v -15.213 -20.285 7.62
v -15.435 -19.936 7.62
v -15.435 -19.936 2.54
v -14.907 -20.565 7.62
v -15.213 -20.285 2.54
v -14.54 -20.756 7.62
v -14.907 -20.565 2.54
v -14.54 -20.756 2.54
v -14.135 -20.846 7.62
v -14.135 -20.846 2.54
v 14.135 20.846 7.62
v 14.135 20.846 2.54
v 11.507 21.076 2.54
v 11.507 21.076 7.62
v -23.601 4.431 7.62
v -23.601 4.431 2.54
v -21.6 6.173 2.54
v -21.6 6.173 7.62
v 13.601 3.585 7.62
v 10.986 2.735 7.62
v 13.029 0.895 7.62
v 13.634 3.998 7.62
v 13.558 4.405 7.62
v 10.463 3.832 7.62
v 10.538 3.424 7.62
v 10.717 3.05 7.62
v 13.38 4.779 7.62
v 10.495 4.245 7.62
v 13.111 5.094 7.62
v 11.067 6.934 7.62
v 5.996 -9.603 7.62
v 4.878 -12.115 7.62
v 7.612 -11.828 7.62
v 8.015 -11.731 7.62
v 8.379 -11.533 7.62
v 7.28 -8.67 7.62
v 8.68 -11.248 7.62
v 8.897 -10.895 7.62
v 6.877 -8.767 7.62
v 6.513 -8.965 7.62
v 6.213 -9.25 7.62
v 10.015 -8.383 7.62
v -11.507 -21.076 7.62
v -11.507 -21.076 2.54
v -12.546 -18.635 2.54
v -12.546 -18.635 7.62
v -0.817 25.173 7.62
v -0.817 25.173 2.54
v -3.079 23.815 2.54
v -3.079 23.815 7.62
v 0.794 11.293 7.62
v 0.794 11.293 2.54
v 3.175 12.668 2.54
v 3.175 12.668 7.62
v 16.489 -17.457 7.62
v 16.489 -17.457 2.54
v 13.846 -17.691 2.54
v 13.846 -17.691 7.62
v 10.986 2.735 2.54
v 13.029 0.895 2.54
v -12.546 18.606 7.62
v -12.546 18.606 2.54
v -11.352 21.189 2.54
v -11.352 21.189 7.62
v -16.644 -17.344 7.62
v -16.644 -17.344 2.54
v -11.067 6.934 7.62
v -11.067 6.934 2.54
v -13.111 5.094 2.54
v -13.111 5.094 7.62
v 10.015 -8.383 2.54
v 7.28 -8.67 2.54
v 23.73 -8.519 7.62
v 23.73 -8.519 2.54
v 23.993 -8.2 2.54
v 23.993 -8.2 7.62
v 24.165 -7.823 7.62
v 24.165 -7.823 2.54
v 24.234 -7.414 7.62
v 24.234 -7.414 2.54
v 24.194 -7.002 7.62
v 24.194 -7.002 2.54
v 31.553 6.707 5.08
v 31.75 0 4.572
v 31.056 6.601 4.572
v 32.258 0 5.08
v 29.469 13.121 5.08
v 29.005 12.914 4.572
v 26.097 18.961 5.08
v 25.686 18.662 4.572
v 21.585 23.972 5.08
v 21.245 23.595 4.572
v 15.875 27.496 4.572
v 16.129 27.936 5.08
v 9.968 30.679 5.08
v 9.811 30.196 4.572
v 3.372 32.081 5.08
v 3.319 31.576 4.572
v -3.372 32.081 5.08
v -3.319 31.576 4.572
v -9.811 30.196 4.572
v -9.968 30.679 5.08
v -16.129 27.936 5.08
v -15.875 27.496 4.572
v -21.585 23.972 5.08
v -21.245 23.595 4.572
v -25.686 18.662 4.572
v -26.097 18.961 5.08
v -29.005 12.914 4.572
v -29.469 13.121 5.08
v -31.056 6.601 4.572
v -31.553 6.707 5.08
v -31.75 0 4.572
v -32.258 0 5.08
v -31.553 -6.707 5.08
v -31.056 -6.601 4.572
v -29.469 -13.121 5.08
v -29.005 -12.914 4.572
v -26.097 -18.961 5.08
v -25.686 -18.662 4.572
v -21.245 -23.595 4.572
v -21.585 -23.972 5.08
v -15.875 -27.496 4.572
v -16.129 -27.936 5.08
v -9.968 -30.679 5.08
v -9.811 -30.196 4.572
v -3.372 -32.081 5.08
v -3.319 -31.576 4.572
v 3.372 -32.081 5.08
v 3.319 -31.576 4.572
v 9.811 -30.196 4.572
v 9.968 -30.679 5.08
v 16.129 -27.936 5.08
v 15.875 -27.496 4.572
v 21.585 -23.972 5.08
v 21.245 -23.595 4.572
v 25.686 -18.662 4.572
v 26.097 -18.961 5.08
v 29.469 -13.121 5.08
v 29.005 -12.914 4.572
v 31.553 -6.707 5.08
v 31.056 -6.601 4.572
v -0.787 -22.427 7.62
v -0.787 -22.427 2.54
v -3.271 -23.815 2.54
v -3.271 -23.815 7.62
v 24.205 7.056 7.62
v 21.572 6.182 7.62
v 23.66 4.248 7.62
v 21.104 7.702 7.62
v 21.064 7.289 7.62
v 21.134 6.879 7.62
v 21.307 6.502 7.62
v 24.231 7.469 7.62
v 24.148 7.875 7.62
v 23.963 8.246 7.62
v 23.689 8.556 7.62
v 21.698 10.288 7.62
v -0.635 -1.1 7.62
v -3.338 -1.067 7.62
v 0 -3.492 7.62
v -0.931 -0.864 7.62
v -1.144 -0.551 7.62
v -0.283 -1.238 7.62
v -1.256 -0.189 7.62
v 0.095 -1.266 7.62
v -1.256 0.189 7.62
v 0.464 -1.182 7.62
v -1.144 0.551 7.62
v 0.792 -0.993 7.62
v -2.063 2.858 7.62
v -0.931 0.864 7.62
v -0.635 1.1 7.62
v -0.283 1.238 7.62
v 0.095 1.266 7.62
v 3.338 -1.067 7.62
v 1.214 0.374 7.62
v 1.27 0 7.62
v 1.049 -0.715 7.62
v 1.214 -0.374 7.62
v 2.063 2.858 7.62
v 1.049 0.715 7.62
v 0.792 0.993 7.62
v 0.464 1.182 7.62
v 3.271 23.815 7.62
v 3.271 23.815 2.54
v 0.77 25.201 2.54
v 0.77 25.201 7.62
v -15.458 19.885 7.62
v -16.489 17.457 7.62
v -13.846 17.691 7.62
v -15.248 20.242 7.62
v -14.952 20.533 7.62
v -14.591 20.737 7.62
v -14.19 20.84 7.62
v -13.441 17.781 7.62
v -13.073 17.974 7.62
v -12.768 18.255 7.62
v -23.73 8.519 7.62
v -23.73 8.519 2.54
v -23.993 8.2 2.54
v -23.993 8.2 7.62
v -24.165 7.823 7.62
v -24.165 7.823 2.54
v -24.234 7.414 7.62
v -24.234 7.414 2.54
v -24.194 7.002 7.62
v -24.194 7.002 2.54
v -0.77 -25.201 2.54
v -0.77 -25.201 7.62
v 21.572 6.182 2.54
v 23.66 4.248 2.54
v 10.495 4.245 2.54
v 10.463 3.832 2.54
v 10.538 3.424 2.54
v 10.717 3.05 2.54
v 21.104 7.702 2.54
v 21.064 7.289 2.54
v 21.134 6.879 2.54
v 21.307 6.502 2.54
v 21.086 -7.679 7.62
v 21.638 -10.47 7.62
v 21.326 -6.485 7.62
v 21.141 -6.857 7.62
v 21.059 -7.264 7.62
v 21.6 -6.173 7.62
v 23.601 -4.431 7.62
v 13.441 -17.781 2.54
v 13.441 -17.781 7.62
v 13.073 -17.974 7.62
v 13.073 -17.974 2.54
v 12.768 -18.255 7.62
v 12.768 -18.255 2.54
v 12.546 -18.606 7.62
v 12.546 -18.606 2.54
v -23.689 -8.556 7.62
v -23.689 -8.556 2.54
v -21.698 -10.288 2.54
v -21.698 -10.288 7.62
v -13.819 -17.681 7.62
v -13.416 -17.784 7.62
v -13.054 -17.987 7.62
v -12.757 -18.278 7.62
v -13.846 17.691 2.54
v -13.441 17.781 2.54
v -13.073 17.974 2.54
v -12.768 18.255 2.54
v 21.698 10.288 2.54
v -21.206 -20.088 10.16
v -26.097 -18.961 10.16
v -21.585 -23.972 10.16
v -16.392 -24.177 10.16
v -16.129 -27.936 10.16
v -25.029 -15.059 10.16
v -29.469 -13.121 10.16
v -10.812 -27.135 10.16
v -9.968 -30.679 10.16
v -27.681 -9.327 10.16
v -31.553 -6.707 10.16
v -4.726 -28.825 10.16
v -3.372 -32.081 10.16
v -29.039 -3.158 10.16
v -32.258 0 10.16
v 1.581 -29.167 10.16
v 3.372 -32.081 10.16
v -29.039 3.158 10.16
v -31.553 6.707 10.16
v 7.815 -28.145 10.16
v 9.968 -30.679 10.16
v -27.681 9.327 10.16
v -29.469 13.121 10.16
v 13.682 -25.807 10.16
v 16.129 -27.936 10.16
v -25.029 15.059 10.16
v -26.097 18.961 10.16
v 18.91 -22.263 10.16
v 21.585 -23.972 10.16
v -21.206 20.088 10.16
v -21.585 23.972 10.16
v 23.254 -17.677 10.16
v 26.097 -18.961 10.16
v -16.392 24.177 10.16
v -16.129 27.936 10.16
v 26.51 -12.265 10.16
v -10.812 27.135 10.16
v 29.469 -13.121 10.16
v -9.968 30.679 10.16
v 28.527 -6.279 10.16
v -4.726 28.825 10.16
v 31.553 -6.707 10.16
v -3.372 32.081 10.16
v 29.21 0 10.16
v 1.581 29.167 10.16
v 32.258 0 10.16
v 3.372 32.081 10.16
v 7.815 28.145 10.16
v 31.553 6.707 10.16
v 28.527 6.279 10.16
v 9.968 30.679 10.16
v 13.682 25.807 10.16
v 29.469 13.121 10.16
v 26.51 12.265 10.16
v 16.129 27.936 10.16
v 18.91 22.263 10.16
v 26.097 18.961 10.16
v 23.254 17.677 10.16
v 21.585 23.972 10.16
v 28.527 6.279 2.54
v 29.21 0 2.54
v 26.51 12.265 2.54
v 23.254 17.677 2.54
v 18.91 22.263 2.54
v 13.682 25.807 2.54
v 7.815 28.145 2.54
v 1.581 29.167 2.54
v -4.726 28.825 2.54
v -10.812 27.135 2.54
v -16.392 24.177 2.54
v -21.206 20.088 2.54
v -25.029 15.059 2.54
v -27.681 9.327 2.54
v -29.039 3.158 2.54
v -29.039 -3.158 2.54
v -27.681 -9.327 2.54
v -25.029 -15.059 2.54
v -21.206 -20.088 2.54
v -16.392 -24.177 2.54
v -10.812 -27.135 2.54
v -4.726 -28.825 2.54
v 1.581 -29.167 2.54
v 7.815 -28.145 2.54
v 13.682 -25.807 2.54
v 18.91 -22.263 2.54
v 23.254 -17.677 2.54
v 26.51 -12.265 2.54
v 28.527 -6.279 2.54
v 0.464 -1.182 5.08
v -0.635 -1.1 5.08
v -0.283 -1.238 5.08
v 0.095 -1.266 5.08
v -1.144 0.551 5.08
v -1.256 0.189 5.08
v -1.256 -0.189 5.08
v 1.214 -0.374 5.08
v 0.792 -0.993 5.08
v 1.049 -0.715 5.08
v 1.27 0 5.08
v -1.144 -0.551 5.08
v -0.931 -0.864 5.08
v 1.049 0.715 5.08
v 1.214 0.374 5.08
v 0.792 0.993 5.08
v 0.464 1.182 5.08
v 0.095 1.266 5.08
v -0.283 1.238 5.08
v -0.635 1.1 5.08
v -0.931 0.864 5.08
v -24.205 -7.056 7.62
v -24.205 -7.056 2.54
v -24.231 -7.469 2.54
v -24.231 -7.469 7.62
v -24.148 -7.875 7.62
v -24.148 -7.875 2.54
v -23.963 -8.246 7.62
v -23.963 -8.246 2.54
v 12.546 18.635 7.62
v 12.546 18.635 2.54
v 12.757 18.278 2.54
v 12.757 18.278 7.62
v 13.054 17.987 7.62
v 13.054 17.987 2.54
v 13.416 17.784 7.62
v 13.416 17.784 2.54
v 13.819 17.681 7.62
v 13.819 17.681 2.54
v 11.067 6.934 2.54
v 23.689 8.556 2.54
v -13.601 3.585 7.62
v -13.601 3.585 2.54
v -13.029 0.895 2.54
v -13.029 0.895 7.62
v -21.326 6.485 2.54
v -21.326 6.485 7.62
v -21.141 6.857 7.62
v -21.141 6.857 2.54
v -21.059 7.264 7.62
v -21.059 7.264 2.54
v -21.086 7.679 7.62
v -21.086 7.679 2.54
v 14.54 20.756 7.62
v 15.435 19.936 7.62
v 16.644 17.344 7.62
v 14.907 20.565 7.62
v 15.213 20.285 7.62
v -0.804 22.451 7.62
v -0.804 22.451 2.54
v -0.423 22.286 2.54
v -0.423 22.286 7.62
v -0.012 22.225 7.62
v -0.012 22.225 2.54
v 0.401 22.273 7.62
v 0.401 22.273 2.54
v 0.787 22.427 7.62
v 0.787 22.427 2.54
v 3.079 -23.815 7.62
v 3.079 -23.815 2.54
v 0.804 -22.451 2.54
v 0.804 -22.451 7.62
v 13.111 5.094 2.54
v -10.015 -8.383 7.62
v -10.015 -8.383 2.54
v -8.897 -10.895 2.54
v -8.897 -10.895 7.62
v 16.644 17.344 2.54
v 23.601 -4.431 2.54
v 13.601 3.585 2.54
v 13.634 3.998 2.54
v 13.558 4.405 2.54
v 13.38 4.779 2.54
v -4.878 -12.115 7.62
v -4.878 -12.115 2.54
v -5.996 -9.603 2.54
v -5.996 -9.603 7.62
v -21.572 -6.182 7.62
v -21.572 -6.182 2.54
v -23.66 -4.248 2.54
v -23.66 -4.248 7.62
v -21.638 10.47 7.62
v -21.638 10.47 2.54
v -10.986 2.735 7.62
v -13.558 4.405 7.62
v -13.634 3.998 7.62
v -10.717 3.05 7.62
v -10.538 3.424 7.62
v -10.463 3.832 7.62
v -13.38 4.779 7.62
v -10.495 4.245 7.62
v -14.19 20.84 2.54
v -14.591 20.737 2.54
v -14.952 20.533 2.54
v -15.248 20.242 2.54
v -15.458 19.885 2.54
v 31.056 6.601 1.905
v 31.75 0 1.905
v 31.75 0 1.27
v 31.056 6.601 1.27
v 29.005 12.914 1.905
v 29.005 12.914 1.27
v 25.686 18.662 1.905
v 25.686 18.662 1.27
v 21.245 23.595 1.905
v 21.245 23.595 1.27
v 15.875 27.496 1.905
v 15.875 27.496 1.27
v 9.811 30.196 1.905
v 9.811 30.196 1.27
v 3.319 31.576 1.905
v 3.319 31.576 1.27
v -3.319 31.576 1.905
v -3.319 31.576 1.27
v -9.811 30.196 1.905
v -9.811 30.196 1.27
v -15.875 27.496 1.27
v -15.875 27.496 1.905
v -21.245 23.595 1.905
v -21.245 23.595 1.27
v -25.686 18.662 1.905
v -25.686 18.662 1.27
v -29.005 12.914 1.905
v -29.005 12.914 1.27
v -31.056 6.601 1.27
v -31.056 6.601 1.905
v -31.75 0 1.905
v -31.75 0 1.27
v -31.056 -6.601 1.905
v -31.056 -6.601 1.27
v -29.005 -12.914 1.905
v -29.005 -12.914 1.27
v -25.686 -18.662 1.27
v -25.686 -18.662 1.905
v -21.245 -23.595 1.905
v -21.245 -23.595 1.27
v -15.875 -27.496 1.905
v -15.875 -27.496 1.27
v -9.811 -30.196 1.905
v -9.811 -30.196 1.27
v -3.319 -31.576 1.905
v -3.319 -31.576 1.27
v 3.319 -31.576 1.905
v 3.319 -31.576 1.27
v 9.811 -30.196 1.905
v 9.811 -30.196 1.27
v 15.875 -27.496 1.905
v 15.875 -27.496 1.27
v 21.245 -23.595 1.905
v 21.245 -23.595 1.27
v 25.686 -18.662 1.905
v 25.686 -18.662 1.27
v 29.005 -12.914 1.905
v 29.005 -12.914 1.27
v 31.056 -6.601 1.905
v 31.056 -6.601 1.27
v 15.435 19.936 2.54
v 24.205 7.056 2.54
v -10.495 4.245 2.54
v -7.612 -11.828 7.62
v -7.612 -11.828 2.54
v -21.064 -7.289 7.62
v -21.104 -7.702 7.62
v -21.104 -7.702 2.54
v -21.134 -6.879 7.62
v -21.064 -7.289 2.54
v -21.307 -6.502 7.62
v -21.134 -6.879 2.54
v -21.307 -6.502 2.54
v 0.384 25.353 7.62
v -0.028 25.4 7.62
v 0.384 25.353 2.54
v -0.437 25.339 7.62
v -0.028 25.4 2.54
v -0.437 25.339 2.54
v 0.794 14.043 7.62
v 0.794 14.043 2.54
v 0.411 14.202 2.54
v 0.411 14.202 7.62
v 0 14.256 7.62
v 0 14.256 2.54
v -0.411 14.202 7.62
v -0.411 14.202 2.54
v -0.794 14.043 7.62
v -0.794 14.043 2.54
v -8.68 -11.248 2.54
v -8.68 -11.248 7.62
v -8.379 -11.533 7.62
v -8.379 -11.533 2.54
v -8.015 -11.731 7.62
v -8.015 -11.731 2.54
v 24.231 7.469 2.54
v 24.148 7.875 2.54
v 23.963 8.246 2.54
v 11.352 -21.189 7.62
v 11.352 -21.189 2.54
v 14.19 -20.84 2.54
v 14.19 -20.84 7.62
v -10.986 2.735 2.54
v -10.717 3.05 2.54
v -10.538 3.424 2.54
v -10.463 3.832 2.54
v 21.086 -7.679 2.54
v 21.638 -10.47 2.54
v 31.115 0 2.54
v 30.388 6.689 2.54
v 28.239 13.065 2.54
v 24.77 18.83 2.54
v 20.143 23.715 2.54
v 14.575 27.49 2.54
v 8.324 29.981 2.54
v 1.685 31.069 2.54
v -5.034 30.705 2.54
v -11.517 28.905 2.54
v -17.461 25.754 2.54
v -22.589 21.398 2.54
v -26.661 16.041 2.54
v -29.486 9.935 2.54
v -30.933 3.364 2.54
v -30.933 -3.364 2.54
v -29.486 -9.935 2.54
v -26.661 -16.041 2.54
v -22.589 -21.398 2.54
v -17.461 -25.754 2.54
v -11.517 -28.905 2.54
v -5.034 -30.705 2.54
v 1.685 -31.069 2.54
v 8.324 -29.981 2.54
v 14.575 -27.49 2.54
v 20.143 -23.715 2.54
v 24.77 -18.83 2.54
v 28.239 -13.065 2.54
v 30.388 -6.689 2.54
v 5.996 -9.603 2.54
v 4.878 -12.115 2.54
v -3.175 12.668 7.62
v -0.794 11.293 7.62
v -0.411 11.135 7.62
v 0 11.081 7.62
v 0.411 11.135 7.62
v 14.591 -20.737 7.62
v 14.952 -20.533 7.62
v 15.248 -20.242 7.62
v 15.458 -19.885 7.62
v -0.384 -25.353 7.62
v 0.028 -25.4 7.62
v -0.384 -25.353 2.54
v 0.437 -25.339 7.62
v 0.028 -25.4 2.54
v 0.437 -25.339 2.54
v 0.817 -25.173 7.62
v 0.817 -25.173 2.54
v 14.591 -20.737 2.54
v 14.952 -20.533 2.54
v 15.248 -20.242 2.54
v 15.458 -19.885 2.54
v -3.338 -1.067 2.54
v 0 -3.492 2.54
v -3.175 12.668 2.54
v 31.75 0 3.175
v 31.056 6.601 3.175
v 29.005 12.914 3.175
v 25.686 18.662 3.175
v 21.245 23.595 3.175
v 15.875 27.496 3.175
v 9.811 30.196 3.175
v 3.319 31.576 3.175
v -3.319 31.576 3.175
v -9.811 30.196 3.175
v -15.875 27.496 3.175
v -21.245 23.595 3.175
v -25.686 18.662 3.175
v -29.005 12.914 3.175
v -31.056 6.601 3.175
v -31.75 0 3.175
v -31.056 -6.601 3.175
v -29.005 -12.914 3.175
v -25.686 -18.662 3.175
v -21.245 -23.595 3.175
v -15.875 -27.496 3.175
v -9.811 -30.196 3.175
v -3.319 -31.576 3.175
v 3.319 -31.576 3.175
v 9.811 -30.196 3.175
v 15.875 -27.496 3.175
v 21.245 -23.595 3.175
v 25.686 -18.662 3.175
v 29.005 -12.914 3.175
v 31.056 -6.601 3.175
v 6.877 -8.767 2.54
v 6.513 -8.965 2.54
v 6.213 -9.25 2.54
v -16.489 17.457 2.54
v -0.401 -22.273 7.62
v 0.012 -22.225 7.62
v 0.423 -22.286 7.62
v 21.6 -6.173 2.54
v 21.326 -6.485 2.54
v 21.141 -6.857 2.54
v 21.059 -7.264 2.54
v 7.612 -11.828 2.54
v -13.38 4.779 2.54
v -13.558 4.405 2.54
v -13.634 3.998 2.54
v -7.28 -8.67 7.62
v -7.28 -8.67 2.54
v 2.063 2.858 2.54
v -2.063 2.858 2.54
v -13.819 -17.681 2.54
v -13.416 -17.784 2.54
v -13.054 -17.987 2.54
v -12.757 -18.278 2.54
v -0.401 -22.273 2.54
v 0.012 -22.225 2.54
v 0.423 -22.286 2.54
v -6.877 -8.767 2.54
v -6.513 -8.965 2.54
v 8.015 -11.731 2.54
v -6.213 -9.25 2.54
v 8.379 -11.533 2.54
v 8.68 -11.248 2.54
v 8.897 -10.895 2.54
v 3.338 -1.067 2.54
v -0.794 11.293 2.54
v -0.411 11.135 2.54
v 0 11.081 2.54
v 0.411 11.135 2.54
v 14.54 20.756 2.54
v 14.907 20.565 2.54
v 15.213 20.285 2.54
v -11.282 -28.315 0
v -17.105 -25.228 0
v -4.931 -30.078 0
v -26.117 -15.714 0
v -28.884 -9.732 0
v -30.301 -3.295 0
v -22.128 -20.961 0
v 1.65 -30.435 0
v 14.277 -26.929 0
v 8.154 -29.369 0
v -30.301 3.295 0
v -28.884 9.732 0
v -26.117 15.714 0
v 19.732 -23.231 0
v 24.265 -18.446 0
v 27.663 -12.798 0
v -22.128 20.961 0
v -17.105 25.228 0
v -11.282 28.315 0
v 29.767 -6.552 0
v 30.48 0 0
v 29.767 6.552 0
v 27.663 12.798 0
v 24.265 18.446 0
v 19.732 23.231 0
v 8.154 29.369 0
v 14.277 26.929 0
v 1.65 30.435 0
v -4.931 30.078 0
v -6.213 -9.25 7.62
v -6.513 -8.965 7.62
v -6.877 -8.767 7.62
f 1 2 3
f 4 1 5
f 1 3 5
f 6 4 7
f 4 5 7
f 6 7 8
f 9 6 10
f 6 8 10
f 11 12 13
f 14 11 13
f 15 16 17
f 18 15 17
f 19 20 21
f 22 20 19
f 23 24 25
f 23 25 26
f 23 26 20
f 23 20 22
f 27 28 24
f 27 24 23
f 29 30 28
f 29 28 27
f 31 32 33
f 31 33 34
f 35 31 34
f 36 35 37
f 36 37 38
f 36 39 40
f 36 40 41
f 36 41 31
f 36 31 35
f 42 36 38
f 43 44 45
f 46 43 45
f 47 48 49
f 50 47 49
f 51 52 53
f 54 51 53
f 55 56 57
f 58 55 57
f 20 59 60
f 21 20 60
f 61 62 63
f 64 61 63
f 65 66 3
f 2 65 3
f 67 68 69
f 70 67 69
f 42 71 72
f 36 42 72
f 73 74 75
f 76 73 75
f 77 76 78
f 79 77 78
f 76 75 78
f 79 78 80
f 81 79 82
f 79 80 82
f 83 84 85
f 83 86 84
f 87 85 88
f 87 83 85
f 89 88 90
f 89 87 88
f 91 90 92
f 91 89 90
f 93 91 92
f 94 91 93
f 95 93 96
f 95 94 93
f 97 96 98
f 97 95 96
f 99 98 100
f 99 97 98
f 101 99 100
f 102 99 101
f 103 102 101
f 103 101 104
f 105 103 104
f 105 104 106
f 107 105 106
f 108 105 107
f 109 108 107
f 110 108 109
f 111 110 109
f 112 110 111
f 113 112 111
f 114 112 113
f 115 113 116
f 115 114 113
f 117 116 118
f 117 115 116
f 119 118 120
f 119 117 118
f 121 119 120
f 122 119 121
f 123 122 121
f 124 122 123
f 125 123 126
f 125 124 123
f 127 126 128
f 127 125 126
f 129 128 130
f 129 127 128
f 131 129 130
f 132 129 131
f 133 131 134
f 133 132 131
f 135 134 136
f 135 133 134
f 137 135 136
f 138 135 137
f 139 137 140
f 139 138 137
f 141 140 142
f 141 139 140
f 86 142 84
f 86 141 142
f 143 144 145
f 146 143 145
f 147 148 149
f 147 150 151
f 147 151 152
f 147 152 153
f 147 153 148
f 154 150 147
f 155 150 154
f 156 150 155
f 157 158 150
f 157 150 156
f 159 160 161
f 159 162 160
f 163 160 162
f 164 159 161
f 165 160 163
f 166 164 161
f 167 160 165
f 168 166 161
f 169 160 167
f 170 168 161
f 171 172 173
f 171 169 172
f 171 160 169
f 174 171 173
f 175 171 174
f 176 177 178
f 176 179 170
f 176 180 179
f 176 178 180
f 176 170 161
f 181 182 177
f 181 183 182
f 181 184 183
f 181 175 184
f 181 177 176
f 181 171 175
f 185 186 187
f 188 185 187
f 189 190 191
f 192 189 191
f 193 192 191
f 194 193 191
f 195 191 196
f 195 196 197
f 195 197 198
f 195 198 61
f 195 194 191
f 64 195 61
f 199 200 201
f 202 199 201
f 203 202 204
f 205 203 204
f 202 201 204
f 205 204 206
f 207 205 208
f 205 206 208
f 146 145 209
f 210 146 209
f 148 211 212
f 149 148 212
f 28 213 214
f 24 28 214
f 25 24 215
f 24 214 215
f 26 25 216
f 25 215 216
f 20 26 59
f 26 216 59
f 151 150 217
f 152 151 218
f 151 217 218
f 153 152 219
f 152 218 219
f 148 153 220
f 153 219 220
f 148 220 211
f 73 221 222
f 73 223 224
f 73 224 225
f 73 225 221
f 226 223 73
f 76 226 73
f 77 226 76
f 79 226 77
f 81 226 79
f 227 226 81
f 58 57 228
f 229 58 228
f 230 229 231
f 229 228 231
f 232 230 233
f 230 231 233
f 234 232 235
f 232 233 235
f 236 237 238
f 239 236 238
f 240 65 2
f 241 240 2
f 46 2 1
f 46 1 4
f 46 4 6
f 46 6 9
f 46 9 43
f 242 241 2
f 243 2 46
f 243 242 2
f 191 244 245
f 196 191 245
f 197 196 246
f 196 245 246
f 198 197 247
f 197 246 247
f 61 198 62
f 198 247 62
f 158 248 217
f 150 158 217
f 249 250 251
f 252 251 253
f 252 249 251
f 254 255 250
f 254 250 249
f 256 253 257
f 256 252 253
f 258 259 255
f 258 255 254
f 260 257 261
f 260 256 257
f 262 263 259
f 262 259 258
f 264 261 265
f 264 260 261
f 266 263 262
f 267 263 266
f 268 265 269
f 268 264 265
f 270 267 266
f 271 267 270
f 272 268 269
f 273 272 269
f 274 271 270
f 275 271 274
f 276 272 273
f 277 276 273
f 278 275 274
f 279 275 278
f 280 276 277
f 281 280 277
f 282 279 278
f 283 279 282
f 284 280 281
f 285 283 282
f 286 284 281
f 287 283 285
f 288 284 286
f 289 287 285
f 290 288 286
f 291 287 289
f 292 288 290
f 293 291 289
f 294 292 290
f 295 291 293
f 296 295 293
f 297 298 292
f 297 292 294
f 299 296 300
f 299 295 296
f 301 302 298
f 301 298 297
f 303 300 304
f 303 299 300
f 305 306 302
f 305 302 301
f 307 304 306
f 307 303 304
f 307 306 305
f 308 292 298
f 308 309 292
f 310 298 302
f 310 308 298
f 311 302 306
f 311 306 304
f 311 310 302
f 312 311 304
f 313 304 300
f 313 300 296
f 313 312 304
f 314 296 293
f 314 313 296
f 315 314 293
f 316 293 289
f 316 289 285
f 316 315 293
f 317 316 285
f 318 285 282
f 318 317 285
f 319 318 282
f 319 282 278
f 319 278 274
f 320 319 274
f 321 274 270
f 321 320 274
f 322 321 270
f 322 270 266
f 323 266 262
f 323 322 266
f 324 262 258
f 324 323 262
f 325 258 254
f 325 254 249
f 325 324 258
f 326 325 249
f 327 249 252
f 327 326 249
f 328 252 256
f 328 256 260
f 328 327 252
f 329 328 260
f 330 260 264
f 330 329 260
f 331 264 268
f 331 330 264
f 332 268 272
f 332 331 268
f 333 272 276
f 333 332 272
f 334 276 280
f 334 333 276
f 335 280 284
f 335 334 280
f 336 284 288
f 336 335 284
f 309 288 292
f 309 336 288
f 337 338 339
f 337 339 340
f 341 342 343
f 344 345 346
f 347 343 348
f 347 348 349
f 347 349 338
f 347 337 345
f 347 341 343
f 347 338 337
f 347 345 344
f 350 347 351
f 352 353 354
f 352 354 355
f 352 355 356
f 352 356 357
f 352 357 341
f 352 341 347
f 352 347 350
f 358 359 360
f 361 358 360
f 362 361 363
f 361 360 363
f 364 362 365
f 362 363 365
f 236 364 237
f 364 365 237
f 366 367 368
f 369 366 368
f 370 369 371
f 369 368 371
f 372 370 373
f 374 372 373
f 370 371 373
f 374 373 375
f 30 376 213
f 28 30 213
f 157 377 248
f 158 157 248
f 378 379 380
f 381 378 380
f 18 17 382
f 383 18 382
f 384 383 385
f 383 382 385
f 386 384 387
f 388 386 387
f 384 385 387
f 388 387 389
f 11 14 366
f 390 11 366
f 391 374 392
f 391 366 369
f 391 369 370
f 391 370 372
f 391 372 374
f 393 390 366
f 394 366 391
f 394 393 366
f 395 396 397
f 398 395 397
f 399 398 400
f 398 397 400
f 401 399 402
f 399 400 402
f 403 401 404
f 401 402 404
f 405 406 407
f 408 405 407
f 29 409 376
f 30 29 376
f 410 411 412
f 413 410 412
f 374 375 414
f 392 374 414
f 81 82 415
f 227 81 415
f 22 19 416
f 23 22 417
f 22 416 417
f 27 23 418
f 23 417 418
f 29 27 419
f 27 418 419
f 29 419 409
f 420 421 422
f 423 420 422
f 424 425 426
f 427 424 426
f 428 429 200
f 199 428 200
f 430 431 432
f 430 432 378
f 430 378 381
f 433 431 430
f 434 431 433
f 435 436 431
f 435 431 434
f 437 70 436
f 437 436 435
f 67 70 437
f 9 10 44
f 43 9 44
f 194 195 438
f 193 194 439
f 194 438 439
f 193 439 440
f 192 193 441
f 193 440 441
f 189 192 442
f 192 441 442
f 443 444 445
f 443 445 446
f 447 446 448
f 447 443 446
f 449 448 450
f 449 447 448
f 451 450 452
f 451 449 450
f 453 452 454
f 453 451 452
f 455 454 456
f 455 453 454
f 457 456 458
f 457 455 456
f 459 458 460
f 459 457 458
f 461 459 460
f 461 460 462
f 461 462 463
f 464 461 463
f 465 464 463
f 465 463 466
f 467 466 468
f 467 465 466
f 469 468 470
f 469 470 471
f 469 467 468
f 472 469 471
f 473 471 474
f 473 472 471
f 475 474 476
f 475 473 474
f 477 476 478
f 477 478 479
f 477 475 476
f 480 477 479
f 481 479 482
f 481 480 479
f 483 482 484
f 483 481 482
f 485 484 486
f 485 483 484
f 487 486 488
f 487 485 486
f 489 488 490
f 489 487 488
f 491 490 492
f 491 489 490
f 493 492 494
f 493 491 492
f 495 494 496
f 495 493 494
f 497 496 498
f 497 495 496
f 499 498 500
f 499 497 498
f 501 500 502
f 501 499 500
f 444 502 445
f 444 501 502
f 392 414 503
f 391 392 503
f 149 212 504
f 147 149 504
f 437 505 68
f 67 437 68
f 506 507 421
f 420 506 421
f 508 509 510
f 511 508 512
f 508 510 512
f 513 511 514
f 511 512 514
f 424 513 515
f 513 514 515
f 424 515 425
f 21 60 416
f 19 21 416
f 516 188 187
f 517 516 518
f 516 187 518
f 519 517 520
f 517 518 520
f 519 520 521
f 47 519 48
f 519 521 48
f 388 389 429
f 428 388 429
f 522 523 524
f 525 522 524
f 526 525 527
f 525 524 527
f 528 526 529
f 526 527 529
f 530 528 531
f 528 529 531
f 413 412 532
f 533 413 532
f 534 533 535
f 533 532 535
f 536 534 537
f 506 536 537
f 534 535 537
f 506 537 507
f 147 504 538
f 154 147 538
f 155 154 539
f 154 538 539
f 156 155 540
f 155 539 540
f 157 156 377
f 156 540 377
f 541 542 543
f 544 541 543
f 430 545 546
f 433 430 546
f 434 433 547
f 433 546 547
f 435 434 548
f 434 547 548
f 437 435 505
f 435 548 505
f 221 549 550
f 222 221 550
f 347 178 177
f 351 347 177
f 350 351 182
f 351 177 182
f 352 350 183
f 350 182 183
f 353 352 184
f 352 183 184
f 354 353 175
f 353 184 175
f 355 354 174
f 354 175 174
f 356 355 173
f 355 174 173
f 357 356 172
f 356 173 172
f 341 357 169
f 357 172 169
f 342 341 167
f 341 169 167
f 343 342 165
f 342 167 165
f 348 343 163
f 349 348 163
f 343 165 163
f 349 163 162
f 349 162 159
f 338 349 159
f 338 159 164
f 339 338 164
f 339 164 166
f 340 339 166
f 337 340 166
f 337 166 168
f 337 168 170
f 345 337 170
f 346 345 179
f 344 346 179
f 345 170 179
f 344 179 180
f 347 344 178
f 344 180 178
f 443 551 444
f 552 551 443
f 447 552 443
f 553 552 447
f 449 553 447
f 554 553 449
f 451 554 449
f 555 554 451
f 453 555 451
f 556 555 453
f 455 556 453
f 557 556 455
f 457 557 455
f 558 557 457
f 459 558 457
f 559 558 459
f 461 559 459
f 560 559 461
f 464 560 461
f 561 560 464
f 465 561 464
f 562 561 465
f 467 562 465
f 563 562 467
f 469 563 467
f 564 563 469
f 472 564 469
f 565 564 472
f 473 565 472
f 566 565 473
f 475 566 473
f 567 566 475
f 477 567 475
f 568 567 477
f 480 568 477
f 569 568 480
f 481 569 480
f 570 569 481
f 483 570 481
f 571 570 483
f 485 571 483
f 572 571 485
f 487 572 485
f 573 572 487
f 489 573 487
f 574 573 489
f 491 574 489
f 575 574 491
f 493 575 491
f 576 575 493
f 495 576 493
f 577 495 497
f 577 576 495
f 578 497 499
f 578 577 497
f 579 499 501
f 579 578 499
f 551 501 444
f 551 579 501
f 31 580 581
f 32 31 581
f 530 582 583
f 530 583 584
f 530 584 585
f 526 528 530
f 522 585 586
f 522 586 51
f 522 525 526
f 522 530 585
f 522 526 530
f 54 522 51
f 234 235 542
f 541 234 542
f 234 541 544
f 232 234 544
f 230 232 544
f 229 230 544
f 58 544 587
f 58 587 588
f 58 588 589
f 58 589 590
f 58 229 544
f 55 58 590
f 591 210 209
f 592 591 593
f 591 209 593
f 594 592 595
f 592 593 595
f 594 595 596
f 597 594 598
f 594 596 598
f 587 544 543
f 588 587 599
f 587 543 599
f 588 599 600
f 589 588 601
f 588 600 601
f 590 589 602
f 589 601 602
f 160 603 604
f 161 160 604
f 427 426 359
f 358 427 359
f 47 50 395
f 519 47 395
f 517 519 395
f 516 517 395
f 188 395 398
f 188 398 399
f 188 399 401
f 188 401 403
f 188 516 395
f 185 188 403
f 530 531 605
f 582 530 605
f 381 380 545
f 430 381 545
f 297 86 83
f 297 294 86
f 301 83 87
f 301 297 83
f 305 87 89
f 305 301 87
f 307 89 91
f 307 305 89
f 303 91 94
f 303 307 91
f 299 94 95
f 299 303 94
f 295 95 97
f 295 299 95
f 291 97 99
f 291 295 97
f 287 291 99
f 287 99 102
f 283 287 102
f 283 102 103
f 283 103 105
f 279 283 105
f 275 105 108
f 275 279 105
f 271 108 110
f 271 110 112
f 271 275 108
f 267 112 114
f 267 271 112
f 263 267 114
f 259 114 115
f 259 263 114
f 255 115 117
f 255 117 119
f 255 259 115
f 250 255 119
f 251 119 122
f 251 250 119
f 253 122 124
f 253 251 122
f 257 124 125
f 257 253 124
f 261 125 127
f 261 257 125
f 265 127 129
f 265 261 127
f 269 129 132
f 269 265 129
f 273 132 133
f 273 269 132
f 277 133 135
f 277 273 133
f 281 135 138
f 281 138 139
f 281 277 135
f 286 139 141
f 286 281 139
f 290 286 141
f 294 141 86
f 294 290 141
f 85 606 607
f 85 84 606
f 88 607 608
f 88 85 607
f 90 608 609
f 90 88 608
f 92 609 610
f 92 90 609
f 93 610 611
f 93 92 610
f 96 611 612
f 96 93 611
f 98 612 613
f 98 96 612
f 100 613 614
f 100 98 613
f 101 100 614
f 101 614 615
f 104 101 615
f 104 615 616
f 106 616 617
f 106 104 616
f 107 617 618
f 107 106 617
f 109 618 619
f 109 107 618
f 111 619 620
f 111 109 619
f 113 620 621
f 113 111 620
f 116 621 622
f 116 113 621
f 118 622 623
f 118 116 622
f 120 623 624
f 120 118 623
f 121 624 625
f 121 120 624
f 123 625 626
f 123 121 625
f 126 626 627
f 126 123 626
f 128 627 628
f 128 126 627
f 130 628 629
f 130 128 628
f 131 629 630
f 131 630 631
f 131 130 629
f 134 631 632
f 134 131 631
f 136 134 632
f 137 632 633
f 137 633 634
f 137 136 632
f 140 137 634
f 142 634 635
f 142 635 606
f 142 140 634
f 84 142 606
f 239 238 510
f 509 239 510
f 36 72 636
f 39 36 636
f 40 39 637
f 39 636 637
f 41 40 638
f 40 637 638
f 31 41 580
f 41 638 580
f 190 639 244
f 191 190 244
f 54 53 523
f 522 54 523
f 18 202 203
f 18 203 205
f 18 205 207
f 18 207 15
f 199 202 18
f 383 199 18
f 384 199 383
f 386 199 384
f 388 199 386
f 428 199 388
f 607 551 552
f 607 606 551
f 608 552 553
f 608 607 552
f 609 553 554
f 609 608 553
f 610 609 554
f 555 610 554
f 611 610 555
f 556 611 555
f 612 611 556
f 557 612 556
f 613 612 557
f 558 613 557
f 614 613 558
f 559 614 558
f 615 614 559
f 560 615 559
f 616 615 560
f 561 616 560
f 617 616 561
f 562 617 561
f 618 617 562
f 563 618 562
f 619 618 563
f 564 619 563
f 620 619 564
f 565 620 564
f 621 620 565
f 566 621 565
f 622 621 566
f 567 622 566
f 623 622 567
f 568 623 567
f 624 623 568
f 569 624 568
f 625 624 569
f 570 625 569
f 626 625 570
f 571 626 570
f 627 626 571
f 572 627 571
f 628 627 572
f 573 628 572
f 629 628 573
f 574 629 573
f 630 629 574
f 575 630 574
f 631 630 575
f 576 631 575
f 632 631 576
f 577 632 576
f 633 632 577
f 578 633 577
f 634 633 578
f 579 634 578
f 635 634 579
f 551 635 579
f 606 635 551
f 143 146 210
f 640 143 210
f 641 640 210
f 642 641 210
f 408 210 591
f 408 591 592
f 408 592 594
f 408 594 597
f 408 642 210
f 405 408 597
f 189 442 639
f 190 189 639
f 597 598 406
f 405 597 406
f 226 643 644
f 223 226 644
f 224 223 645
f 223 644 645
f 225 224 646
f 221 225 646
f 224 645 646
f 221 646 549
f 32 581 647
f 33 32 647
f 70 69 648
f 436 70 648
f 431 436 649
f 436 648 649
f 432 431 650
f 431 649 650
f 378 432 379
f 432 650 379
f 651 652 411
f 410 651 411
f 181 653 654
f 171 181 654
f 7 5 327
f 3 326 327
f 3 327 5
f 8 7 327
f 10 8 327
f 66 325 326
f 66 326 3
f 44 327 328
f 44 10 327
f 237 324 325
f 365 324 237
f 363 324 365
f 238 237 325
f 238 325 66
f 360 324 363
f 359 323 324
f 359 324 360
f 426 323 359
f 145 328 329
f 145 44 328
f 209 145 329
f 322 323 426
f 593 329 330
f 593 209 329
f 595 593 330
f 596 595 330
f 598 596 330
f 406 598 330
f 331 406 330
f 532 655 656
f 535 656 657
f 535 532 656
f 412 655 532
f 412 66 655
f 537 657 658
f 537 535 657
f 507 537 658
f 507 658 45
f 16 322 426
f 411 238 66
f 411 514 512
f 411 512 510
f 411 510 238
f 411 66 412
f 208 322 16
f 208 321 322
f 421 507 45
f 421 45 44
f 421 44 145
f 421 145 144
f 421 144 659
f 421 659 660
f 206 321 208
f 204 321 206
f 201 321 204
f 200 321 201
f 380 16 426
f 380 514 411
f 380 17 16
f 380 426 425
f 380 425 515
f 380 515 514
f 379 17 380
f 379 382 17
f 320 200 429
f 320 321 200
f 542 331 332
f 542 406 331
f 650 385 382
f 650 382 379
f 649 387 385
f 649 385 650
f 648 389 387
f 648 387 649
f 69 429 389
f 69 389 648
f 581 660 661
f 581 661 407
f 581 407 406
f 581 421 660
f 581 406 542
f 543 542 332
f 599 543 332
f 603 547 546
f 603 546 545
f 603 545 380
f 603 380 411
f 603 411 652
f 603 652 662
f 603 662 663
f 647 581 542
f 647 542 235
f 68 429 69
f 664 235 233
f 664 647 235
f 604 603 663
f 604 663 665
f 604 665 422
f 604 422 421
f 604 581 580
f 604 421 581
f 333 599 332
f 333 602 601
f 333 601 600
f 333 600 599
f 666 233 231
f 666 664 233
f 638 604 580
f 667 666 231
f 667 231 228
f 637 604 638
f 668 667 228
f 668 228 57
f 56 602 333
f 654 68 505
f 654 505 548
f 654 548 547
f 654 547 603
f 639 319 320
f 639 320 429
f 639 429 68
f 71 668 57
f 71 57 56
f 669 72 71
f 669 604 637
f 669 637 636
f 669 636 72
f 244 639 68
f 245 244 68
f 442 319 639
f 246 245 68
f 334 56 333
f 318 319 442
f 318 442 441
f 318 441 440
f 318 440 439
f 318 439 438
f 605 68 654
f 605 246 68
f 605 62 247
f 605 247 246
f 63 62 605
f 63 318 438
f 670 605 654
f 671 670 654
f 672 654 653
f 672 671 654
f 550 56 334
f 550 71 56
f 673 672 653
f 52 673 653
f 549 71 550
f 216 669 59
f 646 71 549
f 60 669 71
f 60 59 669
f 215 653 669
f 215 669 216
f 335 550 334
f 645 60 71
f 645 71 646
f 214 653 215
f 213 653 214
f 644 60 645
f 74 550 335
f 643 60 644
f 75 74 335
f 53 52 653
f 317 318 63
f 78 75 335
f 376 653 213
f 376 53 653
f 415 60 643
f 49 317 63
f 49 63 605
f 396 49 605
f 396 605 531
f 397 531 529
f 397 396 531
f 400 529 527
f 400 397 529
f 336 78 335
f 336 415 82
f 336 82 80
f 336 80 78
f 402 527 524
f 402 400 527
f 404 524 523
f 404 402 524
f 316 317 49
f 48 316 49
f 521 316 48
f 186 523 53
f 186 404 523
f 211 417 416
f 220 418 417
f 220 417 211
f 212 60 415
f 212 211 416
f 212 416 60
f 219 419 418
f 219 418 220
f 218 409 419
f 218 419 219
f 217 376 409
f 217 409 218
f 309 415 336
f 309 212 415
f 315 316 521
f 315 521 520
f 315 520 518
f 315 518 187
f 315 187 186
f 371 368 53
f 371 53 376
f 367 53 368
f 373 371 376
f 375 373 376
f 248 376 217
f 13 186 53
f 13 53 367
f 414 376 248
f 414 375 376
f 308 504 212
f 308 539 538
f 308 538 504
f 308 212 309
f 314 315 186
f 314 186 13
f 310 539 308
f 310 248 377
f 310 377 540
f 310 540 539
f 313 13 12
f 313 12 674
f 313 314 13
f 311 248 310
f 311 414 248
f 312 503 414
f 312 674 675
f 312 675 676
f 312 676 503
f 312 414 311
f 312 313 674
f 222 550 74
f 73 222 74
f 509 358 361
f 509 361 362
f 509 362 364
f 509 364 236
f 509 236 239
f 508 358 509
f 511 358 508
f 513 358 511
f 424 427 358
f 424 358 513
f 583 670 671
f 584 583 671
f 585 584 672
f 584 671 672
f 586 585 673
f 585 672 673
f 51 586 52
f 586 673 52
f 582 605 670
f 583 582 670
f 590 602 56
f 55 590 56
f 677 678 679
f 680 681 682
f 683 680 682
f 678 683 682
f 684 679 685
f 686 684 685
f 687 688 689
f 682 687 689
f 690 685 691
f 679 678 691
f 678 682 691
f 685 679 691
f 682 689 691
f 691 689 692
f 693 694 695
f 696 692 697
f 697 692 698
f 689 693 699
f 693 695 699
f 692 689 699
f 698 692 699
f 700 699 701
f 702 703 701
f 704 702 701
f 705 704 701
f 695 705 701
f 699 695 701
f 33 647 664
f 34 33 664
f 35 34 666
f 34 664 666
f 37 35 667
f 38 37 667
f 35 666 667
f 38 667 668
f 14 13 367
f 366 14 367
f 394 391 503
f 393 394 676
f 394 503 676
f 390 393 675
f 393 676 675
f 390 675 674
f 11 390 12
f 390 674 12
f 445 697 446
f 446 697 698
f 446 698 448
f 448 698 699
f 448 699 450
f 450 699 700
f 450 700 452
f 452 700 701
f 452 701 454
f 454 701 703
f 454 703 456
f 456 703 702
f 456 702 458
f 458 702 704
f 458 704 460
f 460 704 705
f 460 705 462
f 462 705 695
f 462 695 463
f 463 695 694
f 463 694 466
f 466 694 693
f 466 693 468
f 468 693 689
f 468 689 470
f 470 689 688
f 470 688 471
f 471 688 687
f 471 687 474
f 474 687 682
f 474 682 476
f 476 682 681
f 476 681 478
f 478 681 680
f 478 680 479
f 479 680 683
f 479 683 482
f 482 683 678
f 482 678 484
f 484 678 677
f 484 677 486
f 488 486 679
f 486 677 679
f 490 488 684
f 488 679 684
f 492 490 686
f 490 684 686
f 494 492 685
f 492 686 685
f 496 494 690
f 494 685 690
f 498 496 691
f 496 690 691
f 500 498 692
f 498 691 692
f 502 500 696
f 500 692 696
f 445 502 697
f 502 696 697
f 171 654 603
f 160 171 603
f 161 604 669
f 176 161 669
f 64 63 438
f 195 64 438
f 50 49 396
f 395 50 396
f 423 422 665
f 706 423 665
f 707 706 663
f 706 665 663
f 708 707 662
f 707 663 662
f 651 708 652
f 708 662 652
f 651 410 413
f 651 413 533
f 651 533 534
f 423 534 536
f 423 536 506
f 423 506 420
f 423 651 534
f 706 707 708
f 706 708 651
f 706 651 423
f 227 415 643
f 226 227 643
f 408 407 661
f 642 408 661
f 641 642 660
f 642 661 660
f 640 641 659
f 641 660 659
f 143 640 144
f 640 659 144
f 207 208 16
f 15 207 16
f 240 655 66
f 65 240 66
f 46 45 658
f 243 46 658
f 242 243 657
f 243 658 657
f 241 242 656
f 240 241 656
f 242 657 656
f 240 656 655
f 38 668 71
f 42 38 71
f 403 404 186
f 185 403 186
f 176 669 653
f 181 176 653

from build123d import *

# Parameters (mm, degrees)
F0_W     = 0.508
F0_H     = 5.08
F3_DEPTH = 7.62
F4_DEPTH = 7.62
F5_SIZE2 = 1.27
F5_SIZE  = 1.27
F6_R     = 1.27
F7_DEPTH = 2.54


with BuildPart() as f1:
    # F0 (on Front) → F1 (revolve)
    with BuildSketch(Plane.XZ):
        Polygon((0, 2.54), (0, 0), (31.75, 0), (31.75, 1.905), (31.115, 2.54), (31.75, 3.175), (31.75, 4.572), (31.75, 5.08), (31.75, 10.16), (29.21, 10.16), (29.21, 2.54), align=None)
        with Locations((32.004, 7.62)):
            Rectangle(F0_W, F0_H)
        Polygon((31.75, 5.08), (31.75, 4.572), (32.258, 5.08), align=None)
    revolve(axis=Axis((0, 0, 16.058525), (0, 0, 1)))

    # F2 (on Top) → F3 (join)
    with BuildSketch(Plane.XY):
        Polygon((2.06324, 2.8575), (-2.06324, 2.8575), (-3.338393, -1.067016), (0, -3.4925), (3.338393, -1.067016), align=None)
        with BuildLine():
            ThreePointArc((0.769589, 25.200985), (-0.027653, 25.399759), (-0.817488, 25.173334))
            Line((-0.817488, 25.173334), (-3.079214, 23.814658))
            Line((-3.079214, 23.814658), (-0.803636, 22.450829))
            ThreePointArc((-0.803636, 22.450829), (-0.011648, 22.225183), (0.786827, 22.426676))
            Line((0.786827, 22.426676), (3.270786, 23.814658))
            Line((3.270786, 23.814658), (0.769589, 25.200985))
        make_face()
        with BuildLine():
            Line((-12.545513, 18.606047), (-11.351783, 21.188983))
            Line((-11.351783, 21.188983), (-14.190157, 20.840378))
            ThreePointArc((-14.190157, 20.840378), (-14.951976, 20.532582), (-15.457876, 19.885148))
            Line((-15.457876, 19.885148), (-16.489041, 17.456547))
            Line((-16.489041, 17.456547), (-13.846421, 17.690737))
            ThreePointArc((-13.846421, 17.690737), (-13.073058, 17.973704), (-12.545513, 18.606047))
        make_face()
        with BuildLine():
            Line((-21.085893, 7.678541), (-21.638357, 10.469837))
            Line((-21.638357, 10.469837), (-23.729745, 8.519455))
            ThreePointArc((-23.729745, 8.519455), (-24.165152, 7.822657), (-24.193881, 7.001511))
            Line((-24.193881, 7.001511), (-23.600615, 4.430628))
            Line((-23.600615, 4.430628), (-21.600345, 6.173385))
            ThreePointArc((-21.600345, 6.173385), (-21.141005, 6.856882), (-21.085893, 7.678541))
        make_face()
        with BuildLine():
            Line((-21.572179, -6.181907), (-23.659814, -4.248432))
            Line((-23.659814, -4.248432), (-24.205377, -7.05561))
            ThreePointArc((-24.205377, -7.05561), (-24.148061, -7.875257), (-23.688646, -8.556465))
            Line((-23.688646, -8.556465), (-21.697556, -10.287641))
            Line((-21.697556, -10.287641), (-21.10367, -7.701991))
            ThreePointArc((-21.10367, -7.701991), (-21.133806, -6.879037), (-21.572179, -6.181907))
        make_face()
        with BuildLine():
            Line((-13.818626, -17.681076), (-16.644026, -17.343943))
            Line((-16.644026, -17.343943), (-15.435377, -19.935672))
            ThreePointArc((-15.435377, -19.935672), (-14.907232, -20.565091), (-14.135153, -20.846162))
            Line((-14.135153, -20.846162), (-11.506769, -21.07638))
            Line((-11.506769, -21.07638), (-12.546111, -18.635468))
            ThreePointArc((-12.546111, -18.635468), (-13.054212, -17.987397), (-13.818626, -17.681076))
        make_face()
        with BuildLine():
            Line((-0.786827, -22.426676), (-3.270786, -23.814658))
            Line((-3.270786, -23.814658), (-0.769589, -25.200985))
            ThreePointArc((-0.769589, -25.200985), (0.027653, -25.399759), (0.817488, -25.173334))
            Line((0.817488, -25.173334), (3.079214, -23.814658))
            Line((3.079214, -23.814658), (0.803636, -22.450829))
            ThreePointArc((0.803636, -22.450829), (0.011648, -22.225183), (-0.786827, -22.426676))
        make_face()
        with BuildLine():
            Line((12.545513, -18.606047), (11.351783, -21.188983))
            Line((11.351783, -21.188983), (14.190157, -20.840378))
            ThreePointArc((14.190157, -20.840378), (14.951976, -20.532582), (15.457876, -19.885148))
            Line((15.457876, -19.885148), (16.489041, -17.456547))
            Line((16.489041, -17.456547), (13.846421, -17.690737))
            ThreePointArc((13.846421, -17.690737), (13.073058, -17.973704), (12.545513, -18.606047))
        make_face()
        with BuildLine():
            Line((21.085893, -7.678541), (21.638357, -10.469837))
            Line((21.638357, -10.469837), (23.729745, -8.519455))
            ThreePointArc((23.729745, -8.519455), (24.165152, -7.822657), (24.193881, -7.001511))
            Line((24.193881, -7.001511), (23.600615, -4.430628))
            Line((23.600615, -4.430628), (21.600345, -6.173385))
            ThreePointArc((21.600345, -6.173385), (21.141005, -6.856882), (21.085893, -7.678541))
        make_face()
        with BuildLine():
            Line((21.572179, 6.181907), (23.659814, 4.248432))
            Line((23.659814, 4.248432), (24.205377, 7.05561))
            ThreePointArc((24.205377, 7.05561), (24.148061, 7.875257), (23.688646, 8.556465))
            Line((23.688646, 8.556465), (21.697556, 10.287641))
            Line((21.697556, 10.287641), (21.10367, 7.701991))
            ThreePointArc((21.10367, 7.701991), (21.133806, 6.879037), (21.572179, 6.181907))
        make_face()
        with BuildLine():
            Line((13.818626, 17.681076), (16.644026, 17.343943))
            Line((16.644026, 17.343943), (15.435377, 19.935672))
            ThreePointArc((15.435377, 19.935672), (14.907232, 20.565091), (14.135153, 20.846162))
            Line((14.135153, 20.846162), (11.506769, 21.07638))
            Line((11.506769, 21.07638), (12.546111, 18.635468))
            ThreePointArc((12.546111, 18.635468), (13.054212, 17.987397), (13.818626, 17.681076))
        make_face()
        with BuildLine():
            Line((-0.79375, 14.043128), (-3.175, 12.668313))
            Line((-3.175, 12.668313), (-0.79375, 11.293497))
            ThreePointArc((-0.79375, 11.293497), (0, 11.080813), (0.79375, 11.293497))
            Line((0.79375, 11.293497), (3.175, 12.668313))
            Line((3.175, 12.668313), (0.79375, 14.043128))
            ThreePointArc((0.79375, 14.043128), (0, 14.255813), (-0.79375, 14.043128))
        make_face()
        with BuildLine():
            Line((-10.495472, 4.244784), (-11.067152, 6.934328))
            Line((-11.067152, 6.934328), (-13.110526, 5.094466))
            ThreePointArc((-13.110526, 5.094466), (-13.558083, 4.405288), (-13.601091, 3.584664))
            Line((-13.601091, 3.584664), (-13.02941, 0.895119))
            Line((-13.02941, 0.895119), (-10.986036, 2.734981))
            ThreePointArc((-10.986036, 2.734981), (-10.538479, 3.424159), (-10.495472, 4.244784))
        make_face()
        with BuildLine():
            Line((-7.280308, -8.670077), (-10.014876, -8.382662))
            Line((-10.014876, -8.382662), (-8.896501, -10.894575))
            ThreePointArc((-8.896501, -10.894575), (-8.379356, -11.533195), (-7.612186, -11.827684))
            Line((-7.612186, -11.827684), (-4.877618, -12.115098))
            Line((-4.877618, -12.115098), (-5.995994, -9.603186))
            ThreePointArc((-5.995994, -9.603186), (-6.513138, -8.964566), (-7.280308, -8.670077))
        make_face()
        with BuildLine():
            Line((5.995994, -9.603186), (4.877618, -12.115098))
            Line((4.877618, -12.115098), (7.612186, -11.827684))
            ThreePointArc((7.612186, -11.827684), (8.379356, -11.533195), (8.896501, -10.894575))
            Line((8.896501, -10.894575), (10.014876, -8.382662))
            Line((10.014876, -8.382662), (7.280308, -8.670077))
            ThreePointArc((7.280308, -8.670077), (6.513138, -8.964566), (5.995994, -9.603186))
        make_face()
        with BuildLine():
            Line((10.986036, 2.734981), (13.02941, 0.895119))
            Line((13.02941, 0.895119), (13.601091, 3.584664))
            ThreePointArc((13.601091, 3.584664), (13.558083, 4.405288), (13.110526, 5.094466))
            Line((13.110526, 5.094466), (11.067152, 6.934328))
            Line((11.067152, 6.934328), (10.495472, 4.244784))
            ThreePointArc((10.495472, 4.244784), (10.538479, 3.424159), (10.986036, 2.734981))
        make_face()
    extrude(amount=F3_DEPTH)

    # F2 (on Top) → F4 (join)
    with BuildSketch(Plane.XY):
        Polygon((2.06324, 2.8575), (-2.06324, 2.8575), (-3.338393, -1.067016), (0, -3.4925), (3.338393, -1.067016), align=None)
        with BuildLine():
            ThreePointArc((0.769589, 25.200985), (-0.027653, 25.399759), (-0.817488, 25.173334))
            Line((-0.817488, 25.173334), (-3.079214, 23.814658))
            Line((-3.079214, 23.814658), (-0.803636, 22.450829))
            ThreePointArc((-0.803636, 22.450829), (-0.011648, 22.225183), (0.786827, 22.426676))
            Line((0.786827, 22.426676), (3.270786, 23.814658))
            Line((3.270786, 23.814658), (0.769589, 25.200985))
        make_face()
        with BuildLine():
            Line((-12.545513, 18.606047), (-11.351783, 21.188983))
            Line((-11.351783, 21.188983), (-14.190157, 20.840378))
            ThreePointArc((-14.190157, 20.840378), (-14.951976, 20.532582), (-15.457876, 19.885148))
            Line((-15.457876, 19.885148), (-16.489041, 17.456547))
            Line((-16.489041, 17.456547), (-13.846421, 17.690737))
            ThreePointArc((-13.846421, 17.690737), (-13.073058, 17.973704), (-12.545513, 18.606047))
        make_face()
        with BuildLine():
            Line((-21.085893, 7.678541), (-21.638357, 10.469837))
            Line((-21.638357, 10.469837), (-23.729745, 8.519455))
            ThreePointArc((-23.729745, 8.519455), (-24.165152, 7.822657), (-24.193881, 7.001511))
            Line((-24.193881, 7.001511), (-23.600615, 4.430628))
            Line((-23.600615, 4.430628), (-21.600345, 6.173385))
            ThreePointArc((-21.600345, 6.173385), (-21.141005, 6.856882), (-21.085893, 7.678541))
        make_face()
        with BuildLine():
            Line((-21.572179, -6.181907), (-23.659814, -4.248432))
            Line((-23.659814, -4.248432), (-24.205377, -7.05561))
            ThreePointArc((-24.205377, -7.05561), (-24.148061, -7.875257), (-23.688646, -8.556465))
            Line((-23.688646, -8.556465), (-21.697556, -10.287641))
            Line((-21.697556, -10.287641), (-21.10367, -7.701991))
            ThreePointArc((-21.10367, -7.701991), (-21.133806, -6.879037), (-21.572179, -6.181907))
        make_face()
        with BuildLine():
            Line((-13.818626, -17.681076), (-16.644026, -17.343943))
            Line((-16.644026, -17.343943), (-15.435377, -19.935672))
            ThreePointArc((-15.435377, -19.935672), (-14.907232, -20.565091), (-14.135153, -20.846162))
            Line((-14.135153, -20.846162), (-11.506769, -21.07638))
            Line((-11.506769, -21.07638), (-12.546111, -18.635468))
            ThreePointArc((-12.546111, -18.635468), (-13.054212, -17.987397), (-13.818626, -17.681076))
        make_face()
        with BuildLine():
            Line((-0.786827, -22.426676), (-3.270786, -23.814658))
            Line((-3.270786, -23.814658), (-0.769589, -25.200985))
            ThreePointArc((-0.769589, -25.200985), (0.027653, -25.399759), (0.817488, -25.173334))
            Line((0.817488, -25.173334), (3.079214, -23.814658))
            Line((3.079214, -23.814658), (0.803636, -22.450829))
            ThreePointArc((0.803636, -22.450829), (0.011648, -22.225183), (-0.786827, -22.426676))
        make_face()
        with BuildLine():
            Line((12.545513, -18.606047), (11.351783, -21.188983))
            Line((11.351783, -21.188983), (14.190157, -20.840378))
            ThreePointArc((14.190157, -20.840378), (14.951976, -20.532582), (15.457876, -19.885148))
            Line((15.457876, -19.885148), (16.489041, -17.456547))
            Line((16.489041, -17.456547), (13.846421, -17.690737))
            ThreePointArc((13.846421, -17.690737), (13.073058, -17.973704), (12.545513, -18.606047))
        make_face()
        with BuildLine():
            Line((21.085893, -7.678541), (21.638357, -10.469837))
            Line((21.638357, -10.469837), (23.729745, -8.519455))
            ThreePointArc((23.729745, -8.519455), (24.165152, -7.822657), (24.193881, -7.001511))
            Line((24.193881, -7.001511), (23.600615, -4.430628))
            Line((23.600615, -4.430628), (21.600345, -6.173385))
            ThreePointArc((21.600345, -6.173385), (21.141005, -6.856882), (21.085893, -7.678541))
        make_face()
        with BuildLine():
            Line((21.572179, 6.181907), (23.659814, 4.248432))
            Line((23.659814, 4.248432), (24.205377, 7.05561))
            ThreePointArc((24.205377, 7.05561), (24.148061, 7.875257), (23.688646, 8.556465))
            Line((23.688646, 8.556465), (21.697556, 10.287641))
            Line((21.697556, 10.287641), (21.10367, 7.701991))
            ThreePointArc((21.10367, 7.701991), (21.133806, 6.879037), (21.572179, 6.181907))
        make_face()
        with BuildLine():
            Line((13.818626, 17.681076), (16.644026, 17.343943))
            Line((16.644026, 17.343943), (15.435377, 19.935672))
            ThreePointArc((15.435377, 19.935672), (14.907232, 20.565091), (14.135153, 20.846162))
            Line((14.135153, 20.846162), (11.506769, 21.07638))
            Line((11.506769, 21.07638), (12.546111, 18.635468))
            ThreePointArc((12.546111, 18.635468), (13.054212, 17.987397), (13.818626, 17.681076))
        make_face()
        with BuildLine():
            Line((-0.79375, 14.043128), (-3.175, 12.668313))
            Line((-3.175, 12.668313), (-0.79375, 11.293497))
            ThreePointArc((-0.79375, 11.293497), (0, 11.080813), (0.79375, 11.293497))
            Line((0.79375, 11.293497), (3.175, 12.668313))
            Line((3.175, 12.668313), (0.79375, 14.043128))
            ThreePointArc((0.79375, 14.043128), (0, 14.255813), (-0.79375, 14.043128))
        make_face()
        with BuildLine():
            Line((-10.495472, 4.244784), (-11.067152, 6.934328))
            Line((-11.067152, 6.934328), (-13.110526, 5.094466))
            ThreePointArc((-13.110526, 5.094466), (-13.558083, 4.405288), (-13.601091, 3.584664))
            Line((-13.601091, 3.584664), (-13.02941, 0.895119))
            Line((-13.02941, 0.895119), (-10.986036, 2.734981))
            ThreePointArc((-10.986036, 2.734981), (-10.538479, 3.424159), (-10.495472, 4.244784))
        make_face()
        with BuildLine():
            Line((-7.280308, -8.670077), (-10.014876, -8.382662))
            Line((-10.014876, -8.382662), (-8.896501, -10.894575))
            ThreePointArc((-8.896501, -10.894575), (-8.379356, -11.533195), (-7.612186, -11.827684))
            Line((-7.612186, -11.827684), (-4.877618, -12.115098))
            Line((-4.877618, -12.115098), (-5.995994, -9.603186))
            ThreePointArc((-5.995994, -9.603186), (-6.513138, -8.964566), (-7.280308, -8.670077))
        make_face()
        with BuildLine():
            Line((5.995994, -9.603186), (4.877618, -12.115098))
            Line((4.877618, -12.115098), (7.612186, -11.827684))
            ThreePointArc((7.612186, -11.827684), (8.379356, -11.533195), (8.896501, -10.894575))
            Line((8.896501, -10.894575), (10.014876, -8.382662))
            Line((10.014876, -8.382662), (7.280308, -8.670077))
            ThreePointArc((7.280308, -8.670077), (6.513138, -8.964566), (5.995994, -9.603186))
        make_face()
        with BuildLine():
            Line((10.986036, 2.734981), (13.02941, 0.895119))
            Line((13.02941, 0.895119), (13.601091, 3.584664))
            ThreePointArc((13.601091, 3.584664), (13.558083, 4.405288), (13.110526, 5.094466))
            Line((13.110526, 5.094466), (11.067152, 6.934328))
            Line((11.067152, 6.934328), (10.495472, 4.244784))
            ThreePointArc((10.495472, 4.244784), (10.538479, 3.424159), (10.986036, 2.734981))
        make_face()
    extrude(amount=F4_DEPTH)

    # F5
    f5_edges = [f1.edges().sort_by_distance(p)[0] for p in [
        (-31.75, 0, 0),
    ]]
    chamfer(f5_edges, length=F5_SIZE, length2=F5_SIZE2)

    # F6 (on face) → F7 (cut)
    with BuildSketch(Plane.XY.offset(7.62)):
        Circle(F6_R)
    extrude(amount=-F7_DEPTH, mode=Mode.SUBTRACT)


solid = f1.part
